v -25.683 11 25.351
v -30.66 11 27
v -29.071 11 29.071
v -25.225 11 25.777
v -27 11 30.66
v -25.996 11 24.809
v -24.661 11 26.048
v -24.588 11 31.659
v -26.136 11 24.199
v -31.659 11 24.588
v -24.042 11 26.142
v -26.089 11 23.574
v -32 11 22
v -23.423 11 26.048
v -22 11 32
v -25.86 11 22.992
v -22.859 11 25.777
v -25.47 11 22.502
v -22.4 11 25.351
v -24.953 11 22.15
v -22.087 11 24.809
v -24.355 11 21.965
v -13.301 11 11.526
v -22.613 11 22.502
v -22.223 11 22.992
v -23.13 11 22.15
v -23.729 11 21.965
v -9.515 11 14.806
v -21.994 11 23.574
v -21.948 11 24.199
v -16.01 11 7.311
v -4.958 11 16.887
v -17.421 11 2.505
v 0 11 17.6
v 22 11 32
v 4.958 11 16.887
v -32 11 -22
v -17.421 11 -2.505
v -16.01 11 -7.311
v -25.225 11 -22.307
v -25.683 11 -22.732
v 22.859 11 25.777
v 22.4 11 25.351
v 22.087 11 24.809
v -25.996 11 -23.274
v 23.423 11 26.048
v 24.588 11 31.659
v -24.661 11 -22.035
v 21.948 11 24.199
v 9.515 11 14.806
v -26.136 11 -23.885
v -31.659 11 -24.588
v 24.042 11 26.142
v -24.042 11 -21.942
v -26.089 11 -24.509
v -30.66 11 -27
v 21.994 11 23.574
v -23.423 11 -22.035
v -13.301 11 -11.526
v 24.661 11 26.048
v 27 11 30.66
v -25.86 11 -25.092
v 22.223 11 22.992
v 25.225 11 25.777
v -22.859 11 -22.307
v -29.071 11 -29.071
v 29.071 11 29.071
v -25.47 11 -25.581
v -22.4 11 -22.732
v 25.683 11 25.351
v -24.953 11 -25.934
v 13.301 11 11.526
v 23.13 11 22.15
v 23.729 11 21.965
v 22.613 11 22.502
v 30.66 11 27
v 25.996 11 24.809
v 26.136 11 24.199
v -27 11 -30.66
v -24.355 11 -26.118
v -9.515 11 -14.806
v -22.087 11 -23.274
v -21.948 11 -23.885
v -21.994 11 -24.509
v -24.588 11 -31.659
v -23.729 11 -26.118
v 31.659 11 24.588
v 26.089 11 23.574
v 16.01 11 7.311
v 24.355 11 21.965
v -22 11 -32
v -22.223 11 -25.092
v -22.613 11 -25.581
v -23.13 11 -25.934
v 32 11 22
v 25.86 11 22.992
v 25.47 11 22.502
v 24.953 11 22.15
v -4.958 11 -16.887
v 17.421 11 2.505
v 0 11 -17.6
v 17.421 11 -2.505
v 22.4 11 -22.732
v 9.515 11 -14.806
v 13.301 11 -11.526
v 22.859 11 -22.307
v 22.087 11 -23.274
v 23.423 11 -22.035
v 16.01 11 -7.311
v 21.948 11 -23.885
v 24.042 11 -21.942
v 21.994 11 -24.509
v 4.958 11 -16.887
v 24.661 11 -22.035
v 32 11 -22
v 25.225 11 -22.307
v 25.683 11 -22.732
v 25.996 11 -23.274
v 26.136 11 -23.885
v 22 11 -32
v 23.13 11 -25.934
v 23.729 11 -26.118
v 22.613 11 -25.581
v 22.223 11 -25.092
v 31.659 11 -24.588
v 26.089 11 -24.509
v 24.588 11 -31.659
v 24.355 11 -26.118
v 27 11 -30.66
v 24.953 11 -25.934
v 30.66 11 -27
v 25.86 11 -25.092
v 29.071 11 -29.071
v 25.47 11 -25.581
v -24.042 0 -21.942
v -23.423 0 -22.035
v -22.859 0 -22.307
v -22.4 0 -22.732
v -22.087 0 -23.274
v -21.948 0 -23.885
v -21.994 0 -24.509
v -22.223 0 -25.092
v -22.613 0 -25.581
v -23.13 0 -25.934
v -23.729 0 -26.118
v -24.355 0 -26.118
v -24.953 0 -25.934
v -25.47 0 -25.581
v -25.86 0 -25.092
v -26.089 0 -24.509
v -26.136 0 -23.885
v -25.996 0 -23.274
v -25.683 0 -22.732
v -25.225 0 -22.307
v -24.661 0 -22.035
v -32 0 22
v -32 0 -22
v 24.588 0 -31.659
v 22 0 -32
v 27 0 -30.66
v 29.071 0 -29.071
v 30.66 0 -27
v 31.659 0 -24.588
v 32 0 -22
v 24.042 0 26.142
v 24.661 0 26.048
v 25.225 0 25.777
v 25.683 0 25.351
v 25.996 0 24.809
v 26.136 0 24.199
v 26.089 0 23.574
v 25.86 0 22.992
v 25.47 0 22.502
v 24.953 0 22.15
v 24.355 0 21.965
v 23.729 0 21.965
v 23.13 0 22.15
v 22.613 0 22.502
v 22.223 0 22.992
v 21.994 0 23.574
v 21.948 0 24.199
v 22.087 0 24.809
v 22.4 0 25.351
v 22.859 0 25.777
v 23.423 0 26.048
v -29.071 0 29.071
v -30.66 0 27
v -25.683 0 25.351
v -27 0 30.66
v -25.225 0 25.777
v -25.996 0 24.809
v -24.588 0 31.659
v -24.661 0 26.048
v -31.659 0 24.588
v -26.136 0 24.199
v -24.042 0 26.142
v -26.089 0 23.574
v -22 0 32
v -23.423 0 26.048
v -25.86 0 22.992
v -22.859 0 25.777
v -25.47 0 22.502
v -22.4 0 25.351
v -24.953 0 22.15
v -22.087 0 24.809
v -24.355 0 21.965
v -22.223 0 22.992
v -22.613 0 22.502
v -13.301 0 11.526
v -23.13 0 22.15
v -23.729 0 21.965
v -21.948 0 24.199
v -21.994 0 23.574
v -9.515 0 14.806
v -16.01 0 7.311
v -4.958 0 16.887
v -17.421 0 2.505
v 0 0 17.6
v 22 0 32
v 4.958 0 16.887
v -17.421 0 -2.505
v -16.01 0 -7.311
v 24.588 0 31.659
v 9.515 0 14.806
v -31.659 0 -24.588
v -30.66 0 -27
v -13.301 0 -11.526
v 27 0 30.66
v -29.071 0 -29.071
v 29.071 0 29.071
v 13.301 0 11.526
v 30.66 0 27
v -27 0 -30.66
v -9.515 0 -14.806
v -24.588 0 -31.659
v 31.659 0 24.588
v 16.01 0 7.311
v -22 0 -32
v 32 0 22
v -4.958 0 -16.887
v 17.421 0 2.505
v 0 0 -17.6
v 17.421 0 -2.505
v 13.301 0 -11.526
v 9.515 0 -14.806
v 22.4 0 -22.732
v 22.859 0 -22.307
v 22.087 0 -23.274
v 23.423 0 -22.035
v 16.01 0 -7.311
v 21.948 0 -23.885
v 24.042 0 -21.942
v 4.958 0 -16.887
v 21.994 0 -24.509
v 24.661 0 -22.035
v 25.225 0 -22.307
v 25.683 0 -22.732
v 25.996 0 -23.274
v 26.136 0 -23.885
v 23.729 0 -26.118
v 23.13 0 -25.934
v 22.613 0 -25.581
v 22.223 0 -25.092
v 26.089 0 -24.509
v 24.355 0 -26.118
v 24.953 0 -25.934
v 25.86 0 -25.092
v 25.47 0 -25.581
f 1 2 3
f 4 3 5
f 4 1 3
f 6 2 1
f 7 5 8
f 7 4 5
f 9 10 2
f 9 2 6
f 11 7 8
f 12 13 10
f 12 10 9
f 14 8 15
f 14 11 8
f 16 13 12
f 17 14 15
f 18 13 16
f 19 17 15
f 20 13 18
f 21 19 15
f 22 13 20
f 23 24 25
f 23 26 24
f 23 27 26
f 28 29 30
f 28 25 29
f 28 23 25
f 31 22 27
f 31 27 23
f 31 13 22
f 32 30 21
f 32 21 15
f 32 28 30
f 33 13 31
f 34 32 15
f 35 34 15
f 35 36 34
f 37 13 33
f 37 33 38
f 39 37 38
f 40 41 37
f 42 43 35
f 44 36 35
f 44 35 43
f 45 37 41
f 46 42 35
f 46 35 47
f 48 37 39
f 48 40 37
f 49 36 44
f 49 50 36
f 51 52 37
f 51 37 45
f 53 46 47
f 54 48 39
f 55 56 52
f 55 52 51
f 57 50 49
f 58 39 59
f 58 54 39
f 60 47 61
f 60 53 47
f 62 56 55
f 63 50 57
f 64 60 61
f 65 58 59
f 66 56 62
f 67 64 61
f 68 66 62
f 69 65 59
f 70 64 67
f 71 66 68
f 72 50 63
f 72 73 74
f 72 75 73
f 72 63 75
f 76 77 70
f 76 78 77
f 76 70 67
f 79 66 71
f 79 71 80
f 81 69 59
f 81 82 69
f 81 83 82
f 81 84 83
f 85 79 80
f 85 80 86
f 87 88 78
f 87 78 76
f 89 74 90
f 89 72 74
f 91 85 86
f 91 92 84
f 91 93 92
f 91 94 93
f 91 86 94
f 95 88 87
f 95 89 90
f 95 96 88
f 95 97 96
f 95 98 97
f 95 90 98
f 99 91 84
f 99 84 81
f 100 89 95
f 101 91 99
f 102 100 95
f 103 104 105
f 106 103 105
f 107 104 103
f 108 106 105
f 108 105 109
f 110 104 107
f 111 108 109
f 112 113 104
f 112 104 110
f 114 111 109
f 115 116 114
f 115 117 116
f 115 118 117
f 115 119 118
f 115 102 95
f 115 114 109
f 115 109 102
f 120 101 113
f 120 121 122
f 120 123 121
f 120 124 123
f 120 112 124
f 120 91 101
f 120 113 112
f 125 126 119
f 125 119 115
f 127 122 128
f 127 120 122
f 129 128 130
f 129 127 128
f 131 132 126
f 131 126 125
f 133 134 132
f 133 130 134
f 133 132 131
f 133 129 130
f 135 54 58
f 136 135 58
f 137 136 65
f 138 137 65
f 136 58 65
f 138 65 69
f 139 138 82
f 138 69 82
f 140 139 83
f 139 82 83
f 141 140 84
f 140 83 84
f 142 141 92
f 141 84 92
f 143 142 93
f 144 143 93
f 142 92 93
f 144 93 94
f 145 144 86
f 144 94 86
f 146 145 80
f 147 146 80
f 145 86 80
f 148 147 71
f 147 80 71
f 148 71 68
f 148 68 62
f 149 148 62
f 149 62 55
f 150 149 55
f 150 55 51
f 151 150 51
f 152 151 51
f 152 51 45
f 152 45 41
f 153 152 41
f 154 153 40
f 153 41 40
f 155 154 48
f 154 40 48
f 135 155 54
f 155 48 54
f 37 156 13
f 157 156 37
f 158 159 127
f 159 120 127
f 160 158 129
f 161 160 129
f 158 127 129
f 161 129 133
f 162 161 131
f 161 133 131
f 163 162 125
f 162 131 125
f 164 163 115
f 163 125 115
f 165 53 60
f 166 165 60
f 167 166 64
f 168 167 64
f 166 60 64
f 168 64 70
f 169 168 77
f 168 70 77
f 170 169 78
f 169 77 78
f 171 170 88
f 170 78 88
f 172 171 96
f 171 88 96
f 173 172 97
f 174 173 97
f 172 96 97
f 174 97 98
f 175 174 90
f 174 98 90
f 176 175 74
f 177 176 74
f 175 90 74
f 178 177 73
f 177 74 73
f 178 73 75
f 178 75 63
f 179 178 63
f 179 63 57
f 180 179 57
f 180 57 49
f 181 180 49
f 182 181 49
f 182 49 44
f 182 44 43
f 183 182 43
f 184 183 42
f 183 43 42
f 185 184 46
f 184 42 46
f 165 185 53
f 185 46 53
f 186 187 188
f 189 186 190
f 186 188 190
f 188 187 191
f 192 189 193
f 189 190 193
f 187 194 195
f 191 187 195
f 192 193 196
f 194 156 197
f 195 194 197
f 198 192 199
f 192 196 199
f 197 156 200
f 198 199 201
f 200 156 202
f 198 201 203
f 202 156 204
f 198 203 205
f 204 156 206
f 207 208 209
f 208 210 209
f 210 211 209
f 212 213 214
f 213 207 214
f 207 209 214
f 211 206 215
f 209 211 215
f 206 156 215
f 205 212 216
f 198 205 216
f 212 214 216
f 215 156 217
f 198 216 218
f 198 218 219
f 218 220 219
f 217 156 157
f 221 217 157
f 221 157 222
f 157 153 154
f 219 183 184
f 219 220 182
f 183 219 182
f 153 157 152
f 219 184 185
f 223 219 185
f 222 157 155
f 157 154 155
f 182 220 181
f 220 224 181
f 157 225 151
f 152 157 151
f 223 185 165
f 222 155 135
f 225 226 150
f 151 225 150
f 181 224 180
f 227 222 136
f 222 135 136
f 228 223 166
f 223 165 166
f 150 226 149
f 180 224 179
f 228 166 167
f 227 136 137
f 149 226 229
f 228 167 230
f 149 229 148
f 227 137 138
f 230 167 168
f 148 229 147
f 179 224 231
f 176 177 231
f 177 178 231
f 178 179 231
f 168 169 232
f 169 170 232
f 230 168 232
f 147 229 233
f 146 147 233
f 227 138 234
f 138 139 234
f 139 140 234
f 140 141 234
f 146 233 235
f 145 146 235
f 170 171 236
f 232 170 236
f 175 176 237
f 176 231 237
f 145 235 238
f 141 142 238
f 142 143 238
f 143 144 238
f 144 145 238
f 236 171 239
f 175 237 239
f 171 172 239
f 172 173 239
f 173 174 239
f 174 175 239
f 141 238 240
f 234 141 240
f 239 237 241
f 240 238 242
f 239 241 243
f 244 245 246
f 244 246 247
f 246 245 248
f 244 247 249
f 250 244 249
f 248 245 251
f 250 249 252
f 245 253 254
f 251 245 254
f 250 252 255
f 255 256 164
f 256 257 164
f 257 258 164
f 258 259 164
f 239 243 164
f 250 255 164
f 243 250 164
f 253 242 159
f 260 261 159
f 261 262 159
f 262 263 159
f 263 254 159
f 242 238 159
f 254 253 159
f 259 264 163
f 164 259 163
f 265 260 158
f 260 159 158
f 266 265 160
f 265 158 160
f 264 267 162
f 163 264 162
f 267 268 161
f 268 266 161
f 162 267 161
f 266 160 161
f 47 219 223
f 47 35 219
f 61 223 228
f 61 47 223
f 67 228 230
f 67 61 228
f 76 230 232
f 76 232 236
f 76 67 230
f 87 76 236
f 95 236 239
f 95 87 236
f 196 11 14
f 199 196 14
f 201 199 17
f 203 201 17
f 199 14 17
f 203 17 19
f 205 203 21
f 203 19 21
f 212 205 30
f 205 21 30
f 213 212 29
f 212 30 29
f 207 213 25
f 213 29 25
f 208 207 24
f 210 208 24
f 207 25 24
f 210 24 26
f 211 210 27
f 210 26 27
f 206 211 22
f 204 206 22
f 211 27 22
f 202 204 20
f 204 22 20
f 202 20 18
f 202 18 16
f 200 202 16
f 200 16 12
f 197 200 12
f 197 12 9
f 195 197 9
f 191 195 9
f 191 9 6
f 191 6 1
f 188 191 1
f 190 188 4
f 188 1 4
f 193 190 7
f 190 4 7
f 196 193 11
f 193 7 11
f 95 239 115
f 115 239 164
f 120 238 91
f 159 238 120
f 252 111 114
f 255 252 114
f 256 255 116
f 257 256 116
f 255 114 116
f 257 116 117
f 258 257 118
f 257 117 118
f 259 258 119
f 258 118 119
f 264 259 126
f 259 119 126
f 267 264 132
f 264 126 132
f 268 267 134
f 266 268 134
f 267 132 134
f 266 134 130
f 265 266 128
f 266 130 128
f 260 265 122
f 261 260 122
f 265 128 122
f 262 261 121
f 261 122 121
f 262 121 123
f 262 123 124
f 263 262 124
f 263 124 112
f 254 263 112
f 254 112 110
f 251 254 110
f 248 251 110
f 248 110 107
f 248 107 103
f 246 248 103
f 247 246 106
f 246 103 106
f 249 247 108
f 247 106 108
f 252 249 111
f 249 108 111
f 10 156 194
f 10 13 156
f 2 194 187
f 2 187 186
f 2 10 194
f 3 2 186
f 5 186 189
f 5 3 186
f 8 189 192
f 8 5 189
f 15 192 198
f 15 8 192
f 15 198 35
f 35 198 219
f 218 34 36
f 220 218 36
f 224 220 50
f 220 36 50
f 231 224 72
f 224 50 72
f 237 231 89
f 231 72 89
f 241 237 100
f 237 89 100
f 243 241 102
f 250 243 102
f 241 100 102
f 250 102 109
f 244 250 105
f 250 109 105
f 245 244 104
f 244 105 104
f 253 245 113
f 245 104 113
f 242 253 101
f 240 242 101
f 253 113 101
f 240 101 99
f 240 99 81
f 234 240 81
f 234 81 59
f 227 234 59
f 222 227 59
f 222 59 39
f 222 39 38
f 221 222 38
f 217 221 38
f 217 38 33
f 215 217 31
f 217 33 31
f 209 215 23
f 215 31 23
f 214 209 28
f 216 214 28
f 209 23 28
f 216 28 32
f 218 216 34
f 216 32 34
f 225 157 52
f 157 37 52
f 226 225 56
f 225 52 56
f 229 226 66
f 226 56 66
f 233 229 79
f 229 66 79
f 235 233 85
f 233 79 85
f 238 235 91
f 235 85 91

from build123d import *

# Parameters (mm, degrees)
SKETCH_1_W          = 64
SKETCH_1_H          = 64
EXTRUDE_1_DEPTH     = 11
SKETCH_2_R          = 17.6
SKETCH_2_R_2        = 2.1
CUT_EXTRUDE_1_DEPTH = 11
FILLET_1_R          = 10


with BuildPart() as part:
    # 草图1 → 凸台-拉伸1 (new body)
    with BuildSketch(Plane(origin=(0, 0, 0), x_dir=(1, 0, 0), z_dir=(0, 1, 0))):
        Rectangle(SKETCH_1_W, SKETCH_1_H)
    extrude(amount=EXTRUDE_1_DEPTH)

    # 草图2 → 切除-拉伸1 (cut)
    with BuildSketch(Plane(origin=(0, 11, 0), x_dir=(1, 0, 0), z_dir=(0, 1, 0))):
        with Locations(Location((0, 0, 0), (0, 0, 270))):
            Circle(SKETCH_2_R)
        with Locations(Location((24.04163056, 24.04163056, 0), (0, 0, 270))):
            Circle(SKETCH_2_R_2)
        with Locations(Location((24.04163056, -24.04163056, 0), (0, 0, 270))):
            Circle(SKETCH_2_R_2)
        with Locations(Location((-24.04163056, -24.04163056, 0), (0, 0, 270))):
            Circle(SKETCH_2_R_2)
        with Locations(Location((-24.04163056, 24.04163056, 0), (0, 0, 270))):
            Circle(SKETCH_2_R_2)
    extrude(amount=-CUT_EXTRUDE_1_DEPTH, mode=Mode.SUBTRACT)

    # 圆角1
    fillet_1_edges = [part.edges().sort_by_distance(p)[0] for p in [
        (32, 5.5, 32),
        (-32, 5.5, 32),
        (-32, 5.5, -32),
        (32, 5.5, -32),
    ]]
    fillet(fillet_1_edges, radius=FILLET_1_R)


solid = part.part
